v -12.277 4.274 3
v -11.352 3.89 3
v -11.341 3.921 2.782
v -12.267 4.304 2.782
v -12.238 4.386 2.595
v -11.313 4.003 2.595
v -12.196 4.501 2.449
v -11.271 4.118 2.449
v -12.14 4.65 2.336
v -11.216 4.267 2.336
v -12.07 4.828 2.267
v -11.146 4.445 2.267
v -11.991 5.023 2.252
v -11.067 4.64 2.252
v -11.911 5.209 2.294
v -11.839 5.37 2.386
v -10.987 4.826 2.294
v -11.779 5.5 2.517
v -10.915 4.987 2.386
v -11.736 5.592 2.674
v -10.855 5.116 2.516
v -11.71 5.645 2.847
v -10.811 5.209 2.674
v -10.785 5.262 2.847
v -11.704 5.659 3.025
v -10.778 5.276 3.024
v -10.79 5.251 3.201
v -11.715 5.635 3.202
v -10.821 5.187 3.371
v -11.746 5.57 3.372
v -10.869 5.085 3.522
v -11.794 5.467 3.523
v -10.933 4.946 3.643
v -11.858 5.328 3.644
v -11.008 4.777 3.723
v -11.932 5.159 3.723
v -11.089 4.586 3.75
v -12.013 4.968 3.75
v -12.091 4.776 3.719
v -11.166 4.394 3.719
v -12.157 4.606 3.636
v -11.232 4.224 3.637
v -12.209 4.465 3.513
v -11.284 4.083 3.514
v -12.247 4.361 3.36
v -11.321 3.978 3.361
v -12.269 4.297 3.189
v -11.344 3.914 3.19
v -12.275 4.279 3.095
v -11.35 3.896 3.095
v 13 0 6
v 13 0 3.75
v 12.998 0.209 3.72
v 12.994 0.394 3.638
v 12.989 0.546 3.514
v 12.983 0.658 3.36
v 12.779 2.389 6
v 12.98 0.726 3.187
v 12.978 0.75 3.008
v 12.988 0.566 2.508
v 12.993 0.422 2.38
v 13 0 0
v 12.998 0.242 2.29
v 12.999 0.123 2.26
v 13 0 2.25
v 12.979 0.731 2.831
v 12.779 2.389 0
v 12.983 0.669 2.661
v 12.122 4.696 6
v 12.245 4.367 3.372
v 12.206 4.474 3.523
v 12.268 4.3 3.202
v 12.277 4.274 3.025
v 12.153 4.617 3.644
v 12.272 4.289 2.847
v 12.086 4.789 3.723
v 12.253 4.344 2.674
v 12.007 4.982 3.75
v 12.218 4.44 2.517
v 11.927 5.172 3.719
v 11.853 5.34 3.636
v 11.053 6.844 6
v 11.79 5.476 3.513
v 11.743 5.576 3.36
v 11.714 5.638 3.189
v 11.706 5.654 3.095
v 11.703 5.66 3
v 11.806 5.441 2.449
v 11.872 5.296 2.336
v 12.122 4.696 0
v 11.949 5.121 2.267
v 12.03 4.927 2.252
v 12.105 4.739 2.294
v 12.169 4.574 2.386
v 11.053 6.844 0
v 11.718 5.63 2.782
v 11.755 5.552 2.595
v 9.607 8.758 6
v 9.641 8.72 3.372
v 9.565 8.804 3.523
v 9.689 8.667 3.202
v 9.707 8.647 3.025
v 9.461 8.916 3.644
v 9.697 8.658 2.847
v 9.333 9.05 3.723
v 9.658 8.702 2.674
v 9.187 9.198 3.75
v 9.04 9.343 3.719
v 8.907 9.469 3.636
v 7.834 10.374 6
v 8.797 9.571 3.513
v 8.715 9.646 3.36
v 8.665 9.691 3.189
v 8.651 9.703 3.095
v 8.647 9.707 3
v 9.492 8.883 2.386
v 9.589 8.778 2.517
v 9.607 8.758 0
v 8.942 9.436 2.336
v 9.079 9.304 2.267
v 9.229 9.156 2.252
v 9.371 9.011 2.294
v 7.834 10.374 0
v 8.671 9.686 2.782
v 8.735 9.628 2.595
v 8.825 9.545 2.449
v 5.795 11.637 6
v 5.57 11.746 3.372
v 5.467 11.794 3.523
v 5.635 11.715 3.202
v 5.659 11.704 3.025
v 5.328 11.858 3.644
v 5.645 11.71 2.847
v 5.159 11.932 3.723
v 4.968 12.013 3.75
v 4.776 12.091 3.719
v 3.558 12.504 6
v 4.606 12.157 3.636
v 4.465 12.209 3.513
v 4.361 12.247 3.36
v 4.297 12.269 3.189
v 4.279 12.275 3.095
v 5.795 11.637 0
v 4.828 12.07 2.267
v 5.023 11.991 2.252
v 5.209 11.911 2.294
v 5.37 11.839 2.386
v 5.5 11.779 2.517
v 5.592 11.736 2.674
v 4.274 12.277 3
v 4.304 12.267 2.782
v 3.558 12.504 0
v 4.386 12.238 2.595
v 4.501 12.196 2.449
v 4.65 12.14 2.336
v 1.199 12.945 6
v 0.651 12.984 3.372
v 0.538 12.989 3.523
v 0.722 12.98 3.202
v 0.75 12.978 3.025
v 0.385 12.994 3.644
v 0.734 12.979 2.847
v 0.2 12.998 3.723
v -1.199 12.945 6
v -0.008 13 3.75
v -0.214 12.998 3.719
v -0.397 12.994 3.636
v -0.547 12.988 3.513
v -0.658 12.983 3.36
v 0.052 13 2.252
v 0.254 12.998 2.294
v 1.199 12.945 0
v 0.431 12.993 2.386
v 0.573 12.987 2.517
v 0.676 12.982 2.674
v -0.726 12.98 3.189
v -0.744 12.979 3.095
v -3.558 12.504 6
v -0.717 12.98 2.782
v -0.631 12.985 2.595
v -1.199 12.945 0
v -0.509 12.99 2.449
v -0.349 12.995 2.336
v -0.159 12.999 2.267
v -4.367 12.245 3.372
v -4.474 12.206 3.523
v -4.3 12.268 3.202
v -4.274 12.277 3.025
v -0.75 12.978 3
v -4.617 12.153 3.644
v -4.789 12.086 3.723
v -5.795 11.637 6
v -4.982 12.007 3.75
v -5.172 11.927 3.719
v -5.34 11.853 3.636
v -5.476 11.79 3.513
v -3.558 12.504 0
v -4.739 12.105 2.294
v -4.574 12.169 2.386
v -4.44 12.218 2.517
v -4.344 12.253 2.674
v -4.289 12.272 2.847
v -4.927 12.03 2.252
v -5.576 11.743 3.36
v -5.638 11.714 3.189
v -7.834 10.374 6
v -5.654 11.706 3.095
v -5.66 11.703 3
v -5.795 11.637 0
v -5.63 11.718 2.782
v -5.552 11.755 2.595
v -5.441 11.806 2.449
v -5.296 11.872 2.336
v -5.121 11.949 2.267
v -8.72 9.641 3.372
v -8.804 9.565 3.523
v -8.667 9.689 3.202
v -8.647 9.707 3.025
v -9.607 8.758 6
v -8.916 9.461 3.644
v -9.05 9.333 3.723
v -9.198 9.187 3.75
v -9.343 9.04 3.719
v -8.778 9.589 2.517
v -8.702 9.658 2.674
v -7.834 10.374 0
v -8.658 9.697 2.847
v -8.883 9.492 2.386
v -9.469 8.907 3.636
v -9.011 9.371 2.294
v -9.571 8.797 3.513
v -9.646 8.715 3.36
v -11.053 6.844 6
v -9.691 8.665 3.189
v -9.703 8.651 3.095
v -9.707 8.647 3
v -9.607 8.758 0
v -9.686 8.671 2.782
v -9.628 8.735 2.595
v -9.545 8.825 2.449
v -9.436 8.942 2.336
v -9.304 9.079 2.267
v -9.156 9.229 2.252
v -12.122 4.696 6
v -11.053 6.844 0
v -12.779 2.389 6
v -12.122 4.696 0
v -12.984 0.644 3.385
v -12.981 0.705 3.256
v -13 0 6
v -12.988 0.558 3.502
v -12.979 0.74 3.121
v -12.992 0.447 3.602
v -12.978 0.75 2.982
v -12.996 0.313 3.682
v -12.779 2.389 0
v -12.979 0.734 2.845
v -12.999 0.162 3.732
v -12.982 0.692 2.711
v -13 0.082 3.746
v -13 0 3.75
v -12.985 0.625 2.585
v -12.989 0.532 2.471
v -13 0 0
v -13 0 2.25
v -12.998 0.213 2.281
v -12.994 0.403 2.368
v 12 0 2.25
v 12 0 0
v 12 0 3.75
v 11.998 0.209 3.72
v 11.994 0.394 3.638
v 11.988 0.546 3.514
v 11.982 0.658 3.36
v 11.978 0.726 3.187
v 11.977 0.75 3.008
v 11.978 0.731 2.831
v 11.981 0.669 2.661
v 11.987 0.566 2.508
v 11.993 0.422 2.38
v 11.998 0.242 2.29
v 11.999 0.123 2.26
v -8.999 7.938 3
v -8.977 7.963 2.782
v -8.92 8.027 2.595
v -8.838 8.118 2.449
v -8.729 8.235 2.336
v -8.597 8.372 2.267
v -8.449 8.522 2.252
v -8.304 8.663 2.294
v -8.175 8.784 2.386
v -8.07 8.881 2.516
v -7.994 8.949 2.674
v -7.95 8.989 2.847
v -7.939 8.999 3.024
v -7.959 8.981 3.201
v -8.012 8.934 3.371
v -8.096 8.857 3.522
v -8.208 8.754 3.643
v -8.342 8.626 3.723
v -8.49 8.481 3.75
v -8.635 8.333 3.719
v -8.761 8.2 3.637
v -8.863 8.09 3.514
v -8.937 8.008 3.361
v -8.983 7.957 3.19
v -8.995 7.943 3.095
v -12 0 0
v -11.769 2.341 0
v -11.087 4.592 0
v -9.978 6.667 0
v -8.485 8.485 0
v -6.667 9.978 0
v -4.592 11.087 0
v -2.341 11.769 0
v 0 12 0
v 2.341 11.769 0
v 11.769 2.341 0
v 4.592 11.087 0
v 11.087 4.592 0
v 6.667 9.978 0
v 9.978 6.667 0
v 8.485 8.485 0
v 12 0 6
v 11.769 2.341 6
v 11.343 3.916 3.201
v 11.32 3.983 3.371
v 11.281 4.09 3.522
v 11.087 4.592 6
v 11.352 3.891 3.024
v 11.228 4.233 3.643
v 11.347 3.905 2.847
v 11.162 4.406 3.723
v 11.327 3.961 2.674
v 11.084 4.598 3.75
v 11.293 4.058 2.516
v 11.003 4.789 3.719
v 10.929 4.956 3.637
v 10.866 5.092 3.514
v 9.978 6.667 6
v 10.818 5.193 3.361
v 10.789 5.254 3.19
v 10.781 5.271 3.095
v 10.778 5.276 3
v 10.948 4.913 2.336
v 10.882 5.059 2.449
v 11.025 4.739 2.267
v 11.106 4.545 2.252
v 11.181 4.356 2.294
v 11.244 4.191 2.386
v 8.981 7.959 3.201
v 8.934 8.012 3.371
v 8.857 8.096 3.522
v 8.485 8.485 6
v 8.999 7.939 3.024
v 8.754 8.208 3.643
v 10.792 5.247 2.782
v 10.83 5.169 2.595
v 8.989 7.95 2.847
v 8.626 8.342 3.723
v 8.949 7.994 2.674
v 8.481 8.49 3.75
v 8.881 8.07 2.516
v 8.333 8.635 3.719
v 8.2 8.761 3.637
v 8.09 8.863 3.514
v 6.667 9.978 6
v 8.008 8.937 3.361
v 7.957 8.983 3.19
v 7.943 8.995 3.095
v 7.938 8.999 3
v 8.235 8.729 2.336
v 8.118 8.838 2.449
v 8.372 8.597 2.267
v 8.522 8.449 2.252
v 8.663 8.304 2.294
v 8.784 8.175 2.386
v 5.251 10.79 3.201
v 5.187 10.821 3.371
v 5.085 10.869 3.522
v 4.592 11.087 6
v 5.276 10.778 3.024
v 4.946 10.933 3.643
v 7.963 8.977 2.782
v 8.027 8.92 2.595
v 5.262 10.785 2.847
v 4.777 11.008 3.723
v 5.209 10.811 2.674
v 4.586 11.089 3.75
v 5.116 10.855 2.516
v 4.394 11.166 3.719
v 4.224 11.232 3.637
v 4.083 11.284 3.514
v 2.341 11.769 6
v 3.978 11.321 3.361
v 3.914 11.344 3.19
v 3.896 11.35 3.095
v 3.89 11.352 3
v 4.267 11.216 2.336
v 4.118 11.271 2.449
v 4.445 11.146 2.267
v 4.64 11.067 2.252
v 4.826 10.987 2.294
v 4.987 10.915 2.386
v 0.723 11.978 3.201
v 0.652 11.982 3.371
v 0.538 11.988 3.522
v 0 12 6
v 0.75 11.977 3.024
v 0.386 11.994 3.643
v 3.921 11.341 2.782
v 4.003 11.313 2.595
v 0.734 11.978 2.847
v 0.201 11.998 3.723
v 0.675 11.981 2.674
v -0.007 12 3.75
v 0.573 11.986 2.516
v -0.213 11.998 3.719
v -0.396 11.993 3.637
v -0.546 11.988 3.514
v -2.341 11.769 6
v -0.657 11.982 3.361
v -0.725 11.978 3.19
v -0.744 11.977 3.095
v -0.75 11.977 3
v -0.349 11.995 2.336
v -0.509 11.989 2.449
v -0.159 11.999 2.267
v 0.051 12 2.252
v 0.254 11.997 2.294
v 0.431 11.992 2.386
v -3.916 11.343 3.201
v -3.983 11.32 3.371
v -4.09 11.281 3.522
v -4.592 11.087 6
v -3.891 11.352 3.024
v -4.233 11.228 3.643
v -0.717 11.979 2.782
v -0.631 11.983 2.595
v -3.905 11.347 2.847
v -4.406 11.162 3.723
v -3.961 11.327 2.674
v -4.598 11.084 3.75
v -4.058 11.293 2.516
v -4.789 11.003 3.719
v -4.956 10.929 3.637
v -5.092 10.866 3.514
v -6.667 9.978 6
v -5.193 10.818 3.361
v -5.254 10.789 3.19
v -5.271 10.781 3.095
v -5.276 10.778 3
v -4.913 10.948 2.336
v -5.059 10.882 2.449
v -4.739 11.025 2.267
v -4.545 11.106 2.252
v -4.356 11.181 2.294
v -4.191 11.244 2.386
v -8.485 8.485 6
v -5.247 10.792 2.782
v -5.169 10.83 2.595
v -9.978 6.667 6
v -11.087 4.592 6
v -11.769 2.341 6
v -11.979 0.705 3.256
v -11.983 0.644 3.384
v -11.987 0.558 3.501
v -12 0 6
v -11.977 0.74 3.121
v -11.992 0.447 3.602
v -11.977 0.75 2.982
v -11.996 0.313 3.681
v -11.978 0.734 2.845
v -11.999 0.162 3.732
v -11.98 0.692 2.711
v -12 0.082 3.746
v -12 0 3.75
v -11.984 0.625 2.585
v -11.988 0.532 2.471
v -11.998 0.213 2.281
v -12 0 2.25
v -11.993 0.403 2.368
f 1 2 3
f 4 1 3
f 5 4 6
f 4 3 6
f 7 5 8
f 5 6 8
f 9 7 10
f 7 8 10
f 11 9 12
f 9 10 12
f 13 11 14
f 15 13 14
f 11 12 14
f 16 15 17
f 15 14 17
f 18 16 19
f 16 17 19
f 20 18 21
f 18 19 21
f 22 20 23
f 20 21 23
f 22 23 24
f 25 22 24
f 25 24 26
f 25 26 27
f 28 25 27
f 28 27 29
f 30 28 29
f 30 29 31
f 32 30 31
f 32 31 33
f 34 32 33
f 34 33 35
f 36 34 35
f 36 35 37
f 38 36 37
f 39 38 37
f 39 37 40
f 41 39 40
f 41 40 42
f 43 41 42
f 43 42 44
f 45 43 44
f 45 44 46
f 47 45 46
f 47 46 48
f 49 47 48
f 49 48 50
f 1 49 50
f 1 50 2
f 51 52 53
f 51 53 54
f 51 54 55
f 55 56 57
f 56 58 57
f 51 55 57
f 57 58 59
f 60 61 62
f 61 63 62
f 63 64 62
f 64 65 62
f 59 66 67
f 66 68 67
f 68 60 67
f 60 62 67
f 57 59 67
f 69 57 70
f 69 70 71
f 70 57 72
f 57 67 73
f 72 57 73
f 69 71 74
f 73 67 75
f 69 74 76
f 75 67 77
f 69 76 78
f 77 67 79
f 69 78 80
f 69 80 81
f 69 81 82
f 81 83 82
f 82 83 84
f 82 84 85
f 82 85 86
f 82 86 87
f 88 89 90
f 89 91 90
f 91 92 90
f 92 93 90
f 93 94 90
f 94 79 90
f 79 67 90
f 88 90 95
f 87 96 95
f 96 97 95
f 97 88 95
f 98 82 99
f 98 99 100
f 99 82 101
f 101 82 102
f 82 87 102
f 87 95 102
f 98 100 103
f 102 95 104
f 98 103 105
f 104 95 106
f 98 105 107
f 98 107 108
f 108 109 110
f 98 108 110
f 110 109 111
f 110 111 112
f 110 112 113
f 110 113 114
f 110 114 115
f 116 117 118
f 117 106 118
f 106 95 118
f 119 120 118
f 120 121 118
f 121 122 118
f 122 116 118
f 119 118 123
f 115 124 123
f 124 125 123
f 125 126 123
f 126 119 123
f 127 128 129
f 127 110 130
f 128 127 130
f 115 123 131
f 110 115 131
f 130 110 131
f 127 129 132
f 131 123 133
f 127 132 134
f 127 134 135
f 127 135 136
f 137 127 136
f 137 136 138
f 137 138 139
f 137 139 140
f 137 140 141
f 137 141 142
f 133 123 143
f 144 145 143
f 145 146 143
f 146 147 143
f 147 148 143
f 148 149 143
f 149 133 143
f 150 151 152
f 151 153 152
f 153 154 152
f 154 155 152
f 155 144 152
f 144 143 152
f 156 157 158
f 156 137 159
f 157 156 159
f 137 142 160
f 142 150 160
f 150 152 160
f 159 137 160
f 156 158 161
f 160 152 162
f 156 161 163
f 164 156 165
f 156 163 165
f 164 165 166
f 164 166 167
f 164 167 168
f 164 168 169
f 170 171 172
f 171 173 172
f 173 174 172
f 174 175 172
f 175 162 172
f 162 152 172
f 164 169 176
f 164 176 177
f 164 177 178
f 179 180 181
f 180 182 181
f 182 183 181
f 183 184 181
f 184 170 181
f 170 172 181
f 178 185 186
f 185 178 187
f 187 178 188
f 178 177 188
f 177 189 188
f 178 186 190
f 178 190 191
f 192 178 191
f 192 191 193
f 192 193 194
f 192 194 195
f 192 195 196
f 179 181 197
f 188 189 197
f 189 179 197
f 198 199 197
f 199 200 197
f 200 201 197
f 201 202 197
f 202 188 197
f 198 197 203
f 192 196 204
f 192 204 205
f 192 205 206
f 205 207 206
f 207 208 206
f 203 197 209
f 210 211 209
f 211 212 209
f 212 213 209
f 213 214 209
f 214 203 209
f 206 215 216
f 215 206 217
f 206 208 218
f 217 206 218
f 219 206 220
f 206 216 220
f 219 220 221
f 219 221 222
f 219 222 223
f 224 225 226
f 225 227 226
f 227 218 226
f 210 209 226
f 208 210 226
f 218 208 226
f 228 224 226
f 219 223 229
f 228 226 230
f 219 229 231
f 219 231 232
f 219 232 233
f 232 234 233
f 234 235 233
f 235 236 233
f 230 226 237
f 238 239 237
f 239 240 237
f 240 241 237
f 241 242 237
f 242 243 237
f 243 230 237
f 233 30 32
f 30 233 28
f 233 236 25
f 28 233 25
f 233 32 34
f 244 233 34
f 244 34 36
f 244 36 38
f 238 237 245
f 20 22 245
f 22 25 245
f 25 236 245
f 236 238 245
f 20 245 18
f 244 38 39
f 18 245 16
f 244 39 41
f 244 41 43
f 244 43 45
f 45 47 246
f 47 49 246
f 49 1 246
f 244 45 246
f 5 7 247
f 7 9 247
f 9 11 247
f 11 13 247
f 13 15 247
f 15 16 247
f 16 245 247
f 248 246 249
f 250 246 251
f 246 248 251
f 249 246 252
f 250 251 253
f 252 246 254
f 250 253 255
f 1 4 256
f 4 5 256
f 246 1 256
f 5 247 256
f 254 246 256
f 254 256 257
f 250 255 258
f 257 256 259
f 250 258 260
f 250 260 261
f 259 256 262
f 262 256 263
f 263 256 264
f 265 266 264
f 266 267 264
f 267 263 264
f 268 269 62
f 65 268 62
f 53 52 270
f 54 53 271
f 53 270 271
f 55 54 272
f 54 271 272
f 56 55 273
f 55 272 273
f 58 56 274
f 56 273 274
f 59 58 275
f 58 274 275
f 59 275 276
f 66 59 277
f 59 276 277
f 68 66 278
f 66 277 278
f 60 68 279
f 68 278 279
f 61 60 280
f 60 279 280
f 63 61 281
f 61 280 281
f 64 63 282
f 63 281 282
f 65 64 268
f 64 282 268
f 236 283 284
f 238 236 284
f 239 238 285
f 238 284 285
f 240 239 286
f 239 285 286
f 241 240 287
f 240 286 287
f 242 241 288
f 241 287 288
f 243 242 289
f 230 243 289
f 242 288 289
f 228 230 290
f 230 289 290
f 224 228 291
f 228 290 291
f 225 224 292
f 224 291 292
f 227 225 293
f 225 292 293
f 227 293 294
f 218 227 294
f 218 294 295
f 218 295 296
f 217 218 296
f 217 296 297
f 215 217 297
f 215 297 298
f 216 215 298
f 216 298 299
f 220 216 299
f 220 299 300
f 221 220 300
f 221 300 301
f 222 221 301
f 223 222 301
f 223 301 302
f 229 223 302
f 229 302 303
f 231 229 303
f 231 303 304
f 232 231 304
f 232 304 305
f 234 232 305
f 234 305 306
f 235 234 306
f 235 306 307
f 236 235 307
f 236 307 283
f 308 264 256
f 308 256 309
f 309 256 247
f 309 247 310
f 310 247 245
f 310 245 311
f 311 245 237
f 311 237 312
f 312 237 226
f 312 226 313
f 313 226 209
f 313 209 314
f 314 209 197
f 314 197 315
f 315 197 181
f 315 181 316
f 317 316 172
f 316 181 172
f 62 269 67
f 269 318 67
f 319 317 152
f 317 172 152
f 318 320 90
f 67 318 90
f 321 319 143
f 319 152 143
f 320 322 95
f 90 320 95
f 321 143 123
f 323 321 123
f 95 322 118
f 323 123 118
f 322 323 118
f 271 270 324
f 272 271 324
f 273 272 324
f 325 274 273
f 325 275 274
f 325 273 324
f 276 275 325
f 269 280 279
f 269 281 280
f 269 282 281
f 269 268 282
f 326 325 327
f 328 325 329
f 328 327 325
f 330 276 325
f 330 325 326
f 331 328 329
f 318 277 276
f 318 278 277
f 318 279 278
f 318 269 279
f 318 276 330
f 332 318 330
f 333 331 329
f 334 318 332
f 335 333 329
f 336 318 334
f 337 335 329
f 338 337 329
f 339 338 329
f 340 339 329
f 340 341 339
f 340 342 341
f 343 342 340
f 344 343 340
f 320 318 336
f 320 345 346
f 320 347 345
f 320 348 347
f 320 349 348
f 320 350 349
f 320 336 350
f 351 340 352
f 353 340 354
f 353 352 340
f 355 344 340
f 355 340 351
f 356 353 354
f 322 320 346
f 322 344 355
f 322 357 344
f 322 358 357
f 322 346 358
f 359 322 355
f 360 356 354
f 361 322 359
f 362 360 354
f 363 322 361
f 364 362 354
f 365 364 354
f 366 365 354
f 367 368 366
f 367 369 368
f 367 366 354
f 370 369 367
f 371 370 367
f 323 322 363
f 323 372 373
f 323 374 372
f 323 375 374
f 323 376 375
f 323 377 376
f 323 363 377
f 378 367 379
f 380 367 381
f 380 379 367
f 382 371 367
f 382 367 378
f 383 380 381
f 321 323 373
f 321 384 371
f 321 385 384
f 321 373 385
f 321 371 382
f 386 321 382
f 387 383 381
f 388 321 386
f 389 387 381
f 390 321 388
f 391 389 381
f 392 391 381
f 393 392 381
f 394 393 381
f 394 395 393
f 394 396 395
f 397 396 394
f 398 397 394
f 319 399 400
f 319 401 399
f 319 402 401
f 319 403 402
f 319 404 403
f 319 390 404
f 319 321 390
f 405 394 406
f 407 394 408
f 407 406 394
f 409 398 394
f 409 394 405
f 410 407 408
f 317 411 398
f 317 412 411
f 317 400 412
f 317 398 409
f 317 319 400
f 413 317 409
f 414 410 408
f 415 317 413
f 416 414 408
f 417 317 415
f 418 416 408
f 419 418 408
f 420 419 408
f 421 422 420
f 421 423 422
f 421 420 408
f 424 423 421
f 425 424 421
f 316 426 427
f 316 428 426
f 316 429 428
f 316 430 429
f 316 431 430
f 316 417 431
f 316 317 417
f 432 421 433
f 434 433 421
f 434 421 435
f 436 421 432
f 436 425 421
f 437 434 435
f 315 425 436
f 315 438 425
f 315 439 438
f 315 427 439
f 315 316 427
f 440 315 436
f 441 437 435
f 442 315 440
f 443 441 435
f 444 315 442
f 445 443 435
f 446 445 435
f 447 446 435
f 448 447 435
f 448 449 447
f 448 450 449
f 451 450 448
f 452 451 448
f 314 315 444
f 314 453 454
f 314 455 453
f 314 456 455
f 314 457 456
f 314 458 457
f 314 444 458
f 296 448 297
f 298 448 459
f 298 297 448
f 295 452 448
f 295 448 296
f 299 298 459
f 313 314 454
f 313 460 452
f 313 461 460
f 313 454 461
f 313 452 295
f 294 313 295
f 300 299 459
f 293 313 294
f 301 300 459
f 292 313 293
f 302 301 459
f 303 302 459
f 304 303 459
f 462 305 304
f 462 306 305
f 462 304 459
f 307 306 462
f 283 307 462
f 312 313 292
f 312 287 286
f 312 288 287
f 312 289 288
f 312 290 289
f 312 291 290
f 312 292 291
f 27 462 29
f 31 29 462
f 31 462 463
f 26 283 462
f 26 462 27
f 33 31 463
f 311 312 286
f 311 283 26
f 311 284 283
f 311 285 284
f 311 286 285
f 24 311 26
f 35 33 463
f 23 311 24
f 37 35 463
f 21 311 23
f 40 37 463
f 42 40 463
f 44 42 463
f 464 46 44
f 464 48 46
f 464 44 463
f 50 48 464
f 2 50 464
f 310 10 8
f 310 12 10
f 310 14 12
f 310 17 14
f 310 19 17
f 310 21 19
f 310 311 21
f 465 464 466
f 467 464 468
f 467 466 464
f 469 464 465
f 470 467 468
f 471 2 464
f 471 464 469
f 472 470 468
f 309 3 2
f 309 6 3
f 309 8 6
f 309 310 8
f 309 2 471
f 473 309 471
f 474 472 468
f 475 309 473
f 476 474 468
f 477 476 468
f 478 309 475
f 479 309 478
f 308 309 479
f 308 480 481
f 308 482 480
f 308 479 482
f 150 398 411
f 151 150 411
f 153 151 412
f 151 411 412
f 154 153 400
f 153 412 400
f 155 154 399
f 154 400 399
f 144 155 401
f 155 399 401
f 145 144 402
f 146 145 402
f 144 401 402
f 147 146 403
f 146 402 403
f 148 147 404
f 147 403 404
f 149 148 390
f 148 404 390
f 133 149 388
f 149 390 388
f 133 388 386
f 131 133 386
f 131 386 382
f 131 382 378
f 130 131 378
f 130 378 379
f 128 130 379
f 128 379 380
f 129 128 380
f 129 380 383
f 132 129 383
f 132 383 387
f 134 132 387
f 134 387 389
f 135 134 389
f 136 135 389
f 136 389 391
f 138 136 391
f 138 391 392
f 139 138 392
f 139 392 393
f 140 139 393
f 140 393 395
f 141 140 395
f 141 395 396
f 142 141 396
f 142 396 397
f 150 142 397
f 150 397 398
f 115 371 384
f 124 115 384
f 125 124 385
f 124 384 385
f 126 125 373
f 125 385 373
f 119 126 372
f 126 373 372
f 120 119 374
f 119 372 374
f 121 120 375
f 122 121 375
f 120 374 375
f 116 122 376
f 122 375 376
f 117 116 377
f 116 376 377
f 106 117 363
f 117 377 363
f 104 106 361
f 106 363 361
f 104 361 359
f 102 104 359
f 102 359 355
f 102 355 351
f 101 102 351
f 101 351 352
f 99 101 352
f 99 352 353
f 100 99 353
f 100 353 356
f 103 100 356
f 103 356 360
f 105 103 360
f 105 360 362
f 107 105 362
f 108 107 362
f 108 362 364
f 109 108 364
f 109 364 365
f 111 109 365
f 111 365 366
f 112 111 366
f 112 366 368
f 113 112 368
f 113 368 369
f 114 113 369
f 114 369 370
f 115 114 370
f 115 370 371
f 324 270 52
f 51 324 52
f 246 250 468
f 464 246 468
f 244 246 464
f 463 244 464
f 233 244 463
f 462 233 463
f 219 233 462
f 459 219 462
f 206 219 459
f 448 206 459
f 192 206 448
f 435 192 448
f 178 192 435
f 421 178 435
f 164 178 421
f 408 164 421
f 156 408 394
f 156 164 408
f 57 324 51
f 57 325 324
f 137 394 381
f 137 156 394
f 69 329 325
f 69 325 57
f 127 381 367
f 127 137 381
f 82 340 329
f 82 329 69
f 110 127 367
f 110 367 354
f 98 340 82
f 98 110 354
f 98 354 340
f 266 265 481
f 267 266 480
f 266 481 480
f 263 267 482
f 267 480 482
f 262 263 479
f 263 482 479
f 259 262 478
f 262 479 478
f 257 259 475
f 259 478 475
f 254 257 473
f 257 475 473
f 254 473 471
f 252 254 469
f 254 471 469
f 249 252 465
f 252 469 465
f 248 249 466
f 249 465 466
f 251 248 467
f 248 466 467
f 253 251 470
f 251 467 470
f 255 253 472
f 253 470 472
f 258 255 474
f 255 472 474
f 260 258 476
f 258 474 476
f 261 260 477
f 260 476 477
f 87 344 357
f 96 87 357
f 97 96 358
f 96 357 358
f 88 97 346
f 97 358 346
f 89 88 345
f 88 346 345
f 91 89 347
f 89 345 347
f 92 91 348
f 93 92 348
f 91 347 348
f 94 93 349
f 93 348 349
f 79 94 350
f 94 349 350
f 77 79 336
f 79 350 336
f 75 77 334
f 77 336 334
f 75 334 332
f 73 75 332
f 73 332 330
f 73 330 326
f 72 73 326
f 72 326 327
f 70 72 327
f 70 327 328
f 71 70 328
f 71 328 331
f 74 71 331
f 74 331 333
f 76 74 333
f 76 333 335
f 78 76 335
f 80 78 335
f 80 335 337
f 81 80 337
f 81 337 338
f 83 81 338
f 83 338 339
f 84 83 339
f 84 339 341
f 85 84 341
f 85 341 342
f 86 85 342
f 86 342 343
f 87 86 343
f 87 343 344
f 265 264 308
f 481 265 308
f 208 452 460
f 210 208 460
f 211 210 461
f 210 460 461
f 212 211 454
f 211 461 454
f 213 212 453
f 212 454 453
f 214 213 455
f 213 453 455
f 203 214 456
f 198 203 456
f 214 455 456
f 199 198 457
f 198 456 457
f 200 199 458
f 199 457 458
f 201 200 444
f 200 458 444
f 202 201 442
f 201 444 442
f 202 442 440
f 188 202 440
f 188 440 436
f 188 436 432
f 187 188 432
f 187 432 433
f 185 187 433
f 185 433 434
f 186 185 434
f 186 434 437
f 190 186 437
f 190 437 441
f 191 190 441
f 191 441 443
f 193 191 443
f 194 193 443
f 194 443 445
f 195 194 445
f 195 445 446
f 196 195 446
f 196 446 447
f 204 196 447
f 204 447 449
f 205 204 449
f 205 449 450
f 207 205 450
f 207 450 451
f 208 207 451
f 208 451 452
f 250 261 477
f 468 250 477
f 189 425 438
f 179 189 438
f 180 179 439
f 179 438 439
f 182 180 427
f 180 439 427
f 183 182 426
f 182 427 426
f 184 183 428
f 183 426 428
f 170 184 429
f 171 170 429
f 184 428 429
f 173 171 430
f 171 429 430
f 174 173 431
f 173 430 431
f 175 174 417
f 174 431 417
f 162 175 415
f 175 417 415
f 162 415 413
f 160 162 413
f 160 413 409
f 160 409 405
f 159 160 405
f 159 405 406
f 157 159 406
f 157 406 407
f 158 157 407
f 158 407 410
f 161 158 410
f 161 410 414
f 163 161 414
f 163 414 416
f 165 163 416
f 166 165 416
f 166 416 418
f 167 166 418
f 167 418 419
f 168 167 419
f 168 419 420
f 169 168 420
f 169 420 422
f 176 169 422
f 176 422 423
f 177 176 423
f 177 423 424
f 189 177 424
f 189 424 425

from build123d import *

# Parameters (mm, degrees)
SKETCH_1_R               = 13
SKETCH_1_R_2             = 12
EXTRUDE_1_DEPTH          = 6
SKETCH_2_R               = 0.75
CUT_EXTRUDE_1_DEPTH      = 14
PATTERN_CIRCULAR_1_COUNT = 16
SKETCH_3_W               = 36.79853237
SKETCH_3_H               = 11.94610836
CUT_EXTRUDE_2_DEPTH      = 14.0000001


with BuildPart() as part:
    # ｽｹｯﾁ1 → ﾎﾞｽ - 押し出し1 (new body)
    with BuildSketch(Plane.XY):
        Circle(SKETCH_1_R)
        Circle(SKETCH_1_R_2, mode=Mode.SUBTRACT)
    extrude(amount=EXTRUDE_1_DEPTH)

    # ｽｹｯﾁ2 → ｶｯﾄ - 押し出し1 (cut, through all)
    with BuildSketch(Plane(origin=(0, 0, 0), x_dir=(1, 0, 0), z_dir=(0, 1, 0))):
        with Locations((0, -3)):
            Circle(SKETCH_2_R)
    cut_extrude_1 = extrude(amount=-CUT_EXTRUDE_1_DEPTH, mode=Mode.SUBTRACT)

    # 円形ﾊﾟﾀｰﾝ1: ｶｯﾄ - 押し出し1 ×16 about axis
    pattern_circular_1_axis = Axis((0, 0, 0), (0, 0, 1))
    for i in range(1, PATTERN_CIRCULAR_1_COUNT):
        add(cut_extrude_1.rotate(pattern_circular_1_axis, i * 360 / PATTERN_CIRCULAR_1_COUNT), mode=Mode.SUBTRACT)

    # ｽｹｯﾁ3 → ｶｯﾄ - 押し出し2 (cut, through all)
    with BuildSketch(Plane(origin=(0, 0, 0), x_dir=(1, 0, 0), z_dir=(0, 1, 0))):
        with Locations((0, -2.028241391)):
            Rectangle(SKETCH_3_W, SKETCH_3_H)
    extrude(amount=-CUT_EXTRUDE_2_DEPTH, mode=Mode.SUBTRACT)


solid = part.part
